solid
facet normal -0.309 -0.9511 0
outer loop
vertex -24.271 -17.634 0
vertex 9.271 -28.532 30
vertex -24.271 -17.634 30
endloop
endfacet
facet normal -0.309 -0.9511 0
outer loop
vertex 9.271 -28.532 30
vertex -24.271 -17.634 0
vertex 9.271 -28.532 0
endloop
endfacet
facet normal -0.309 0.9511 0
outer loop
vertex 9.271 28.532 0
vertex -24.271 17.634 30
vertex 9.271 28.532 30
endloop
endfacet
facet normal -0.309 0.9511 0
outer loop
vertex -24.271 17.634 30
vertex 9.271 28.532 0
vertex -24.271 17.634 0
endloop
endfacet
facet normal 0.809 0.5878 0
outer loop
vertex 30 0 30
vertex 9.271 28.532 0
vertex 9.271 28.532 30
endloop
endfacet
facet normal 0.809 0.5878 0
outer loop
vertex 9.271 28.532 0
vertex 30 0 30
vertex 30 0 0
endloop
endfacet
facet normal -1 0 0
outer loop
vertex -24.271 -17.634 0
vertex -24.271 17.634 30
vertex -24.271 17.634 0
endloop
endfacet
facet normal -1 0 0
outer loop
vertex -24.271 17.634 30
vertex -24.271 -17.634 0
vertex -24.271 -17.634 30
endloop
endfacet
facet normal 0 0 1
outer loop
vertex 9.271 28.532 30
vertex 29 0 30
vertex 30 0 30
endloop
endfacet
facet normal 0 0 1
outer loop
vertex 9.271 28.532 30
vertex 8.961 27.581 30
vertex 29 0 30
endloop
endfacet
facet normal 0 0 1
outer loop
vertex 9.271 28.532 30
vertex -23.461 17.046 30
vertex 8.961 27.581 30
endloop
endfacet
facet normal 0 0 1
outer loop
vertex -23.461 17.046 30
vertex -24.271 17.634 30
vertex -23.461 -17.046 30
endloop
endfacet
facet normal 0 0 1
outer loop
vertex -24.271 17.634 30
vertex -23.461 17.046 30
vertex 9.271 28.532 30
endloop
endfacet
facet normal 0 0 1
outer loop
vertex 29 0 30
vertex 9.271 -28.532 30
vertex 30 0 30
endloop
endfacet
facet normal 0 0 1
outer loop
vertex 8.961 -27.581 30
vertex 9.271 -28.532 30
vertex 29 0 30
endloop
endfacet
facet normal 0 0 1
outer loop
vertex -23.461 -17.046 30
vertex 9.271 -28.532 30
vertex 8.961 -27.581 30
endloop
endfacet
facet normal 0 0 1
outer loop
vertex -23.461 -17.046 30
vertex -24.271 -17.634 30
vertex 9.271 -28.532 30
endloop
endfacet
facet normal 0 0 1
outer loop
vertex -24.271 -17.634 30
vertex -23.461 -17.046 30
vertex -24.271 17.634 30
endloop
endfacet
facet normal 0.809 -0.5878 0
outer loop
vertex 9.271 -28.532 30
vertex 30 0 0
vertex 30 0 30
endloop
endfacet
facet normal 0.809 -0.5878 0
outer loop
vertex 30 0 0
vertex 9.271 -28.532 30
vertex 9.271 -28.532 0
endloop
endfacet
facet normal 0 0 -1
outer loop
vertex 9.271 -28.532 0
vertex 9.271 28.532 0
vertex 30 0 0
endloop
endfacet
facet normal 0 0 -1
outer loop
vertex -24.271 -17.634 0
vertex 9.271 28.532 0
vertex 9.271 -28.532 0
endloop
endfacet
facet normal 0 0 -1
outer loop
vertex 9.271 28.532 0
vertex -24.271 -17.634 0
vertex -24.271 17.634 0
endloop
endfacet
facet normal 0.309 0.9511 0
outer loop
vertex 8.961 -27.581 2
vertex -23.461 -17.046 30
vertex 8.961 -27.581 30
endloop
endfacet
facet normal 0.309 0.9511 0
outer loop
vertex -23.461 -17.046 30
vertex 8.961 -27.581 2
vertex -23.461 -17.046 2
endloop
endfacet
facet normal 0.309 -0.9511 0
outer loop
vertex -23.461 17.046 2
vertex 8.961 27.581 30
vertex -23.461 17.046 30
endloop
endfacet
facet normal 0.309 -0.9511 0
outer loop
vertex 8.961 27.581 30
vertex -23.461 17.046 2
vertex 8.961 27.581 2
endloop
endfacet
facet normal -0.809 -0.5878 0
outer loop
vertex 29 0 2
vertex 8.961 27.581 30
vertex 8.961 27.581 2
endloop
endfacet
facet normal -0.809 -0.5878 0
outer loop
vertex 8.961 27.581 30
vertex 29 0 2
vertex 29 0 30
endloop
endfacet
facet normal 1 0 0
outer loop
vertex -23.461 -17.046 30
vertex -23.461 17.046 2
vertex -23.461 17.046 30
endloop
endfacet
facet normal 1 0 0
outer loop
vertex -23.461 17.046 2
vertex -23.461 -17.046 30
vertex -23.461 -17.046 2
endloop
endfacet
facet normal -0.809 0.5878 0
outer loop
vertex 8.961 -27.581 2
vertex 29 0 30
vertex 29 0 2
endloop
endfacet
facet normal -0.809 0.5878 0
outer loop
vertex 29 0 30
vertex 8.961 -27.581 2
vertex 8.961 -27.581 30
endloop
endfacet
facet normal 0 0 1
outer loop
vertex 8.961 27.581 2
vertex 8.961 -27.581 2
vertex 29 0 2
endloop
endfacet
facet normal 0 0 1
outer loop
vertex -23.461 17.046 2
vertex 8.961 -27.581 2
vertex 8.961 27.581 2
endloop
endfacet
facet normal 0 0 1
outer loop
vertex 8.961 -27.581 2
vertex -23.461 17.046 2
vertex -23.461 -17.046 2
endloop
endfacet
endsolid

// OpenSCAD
// Simple Customizable Cup.

// By Donald E. King, 1/8/2013

// Written primarily to check out the Thingiverse.com Customizer feature.

// resolution of circles, cylinders and spheres
1_res = 5;  // [120, 60, 50, 40, 30, 20, 13, 12, 11, 10, 9, 8, 7, 6, 5, 4, 3]

// outside radius of cup
radius_1 = 30;

// height of cup
height_1 = 30;

// wall thickness (negative values produce a disc wthout walls)
t_wall = 1; //  [0.5, 1, 1.5, 2, 2.5, 3, 4, 5, -1]

// bottom thickness (negative values produce a hollow cylinder)
t_bottom = 2;  //  [0.5, 1, 1.5, 2, 2.5, 3, 4, 5, -1]


difference()
{

translate([0, 0, height_1/2])
cylinder(r = radius_1, h = height_1, center = true, $fn = 1_res);

translate([0, 0, t_bottom + 2*height_1/2])
cylinder(r = radius_1-t_wall, h = 2*height_1, center = true, $fn = 1_res);

}
